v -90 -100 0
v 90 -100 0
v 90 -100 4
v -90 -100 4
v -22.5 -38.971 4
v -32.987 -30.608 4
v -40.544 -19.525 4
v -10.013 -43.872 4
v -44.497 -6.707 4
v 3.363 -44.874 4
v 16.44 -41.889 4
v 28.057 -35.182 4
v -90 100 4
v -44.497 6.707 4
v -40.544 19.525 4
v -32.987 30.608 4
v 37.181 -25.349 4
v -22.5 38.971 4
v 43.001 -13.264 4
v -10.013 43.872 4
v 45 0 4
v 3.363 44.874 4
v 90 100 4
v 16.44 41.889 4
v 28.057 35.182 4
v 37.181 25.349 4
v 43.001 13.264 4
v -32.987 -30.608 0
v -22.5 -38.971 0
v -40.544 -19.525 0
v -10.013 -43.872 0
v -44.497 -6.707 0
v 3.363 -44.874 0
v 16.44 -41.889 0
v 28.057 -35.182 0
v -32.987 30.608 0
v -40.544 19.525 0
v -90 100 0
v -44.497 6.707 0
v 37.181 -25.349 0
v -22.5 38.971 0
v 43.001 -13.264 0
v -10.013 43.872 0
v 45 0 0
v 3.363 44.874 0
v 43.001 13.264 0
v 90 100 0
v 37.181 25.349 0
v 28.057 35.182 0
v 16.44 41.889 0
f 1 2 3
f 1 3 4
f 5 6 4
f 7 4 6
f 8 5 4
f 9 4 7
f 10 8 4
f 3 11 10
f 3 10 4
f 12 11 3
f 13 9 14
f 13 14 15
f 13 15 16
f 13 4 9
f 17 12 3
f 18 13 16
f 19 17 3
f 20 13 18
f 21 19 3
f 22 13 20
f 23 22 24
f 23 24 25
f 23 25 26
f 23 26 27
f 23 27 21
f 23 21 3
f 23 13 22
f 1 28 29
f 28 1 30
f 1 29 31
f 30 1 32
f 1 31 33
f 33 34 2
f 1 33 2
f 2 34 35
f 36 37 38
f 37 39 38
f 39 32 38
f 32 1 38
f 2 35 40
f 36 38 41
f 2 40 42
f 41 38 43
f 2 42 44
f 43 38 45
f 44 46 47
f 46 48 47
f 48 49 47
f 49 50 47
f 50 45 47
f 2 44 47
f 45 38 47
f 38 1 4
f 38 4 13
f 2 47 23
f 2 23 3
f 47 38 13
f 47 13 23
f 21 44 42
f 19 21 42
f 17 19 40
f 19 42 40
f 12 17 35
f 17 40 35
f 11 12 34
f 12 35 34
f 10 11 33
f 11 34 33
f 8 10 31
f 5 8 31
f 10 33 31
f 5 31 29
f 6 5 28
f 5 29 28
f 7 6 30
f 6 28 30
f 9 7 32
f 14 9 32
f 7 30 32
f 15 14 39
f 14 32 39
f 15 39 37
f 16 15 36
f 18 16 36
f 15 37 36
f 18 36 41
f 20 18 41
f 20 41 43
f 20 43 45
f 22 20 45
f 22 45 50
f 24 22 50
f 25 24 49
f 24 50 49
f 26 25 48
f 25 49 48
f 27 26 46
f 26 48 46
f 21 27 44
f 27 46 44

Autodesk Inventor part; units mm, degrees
ref_plane "YZ Plane" through (0, 0, 0) normal (1, 0, 0) x (0, 1, 0)
ref_plane "XZ Plane" through (0, 0, 0) normal (0, 1, 0) x (-1, 0, 0)
ref_plane "XY Plane" through (0, 0, 0) normal (0, 0, 1) x (1, 0, 0)
sketch "Sketch1" plane through (0, 0, 0) normal (0, 0, 1) x (1, 0, 0)
  line L0 (-90, 100) -> (90, 100)
  line L1 (90, 100) -> (90, -100)
  line L2 (90, -100) -> (-90, -100)
  line L3 (-90, -100) -> (-90, 100)
  line L4 (-90, 100) -> (90, -100) construction
  line L5 (90, 100) -> (-90, -100) construction
  point P0 (0, 0)
  dimension "d0" = 180
  dimension "d1" = 200
extrude "Plate1" add sketch "Sketch1" along normal blind 4
sketch "Sketch2" plane through (0, 0, 0) normal (0, 0, 1) x (1, 0, 0)
  circle A0 centre (0, 0) radius 45
  dimension "d3" = 90
extrude "Extrusion1" cut sketch "Sketch2" along normal blind 10
equation "\"d2\" = Thickness"
equation "\"BendRadius\" = Thickness"
equation "\"BendReliefWidth\" = Thickness"
equation "\"BendReliefDepth\" = 0.5 * Thickness"
equation "\"CornerReliefSize\" = 4 * Thickness"
equation "\"MinimumRemnant\" = 2 * Thickness"
equation "\"TransitionRadius\" = BendRadius"
equation "\"JacobiRadiusSize\" = BendRadius"
equation "\"GapSize\" = Thickness"
equation "\"Конус_Угол_продольный\" = 52.4deg"
equation "\"Конус_Угол_поперечный\" = 52deg"
equation "\"Thickness\" = 4"
properties part number "MSC 111 cone IN bottom" material "Stainless Steel"
